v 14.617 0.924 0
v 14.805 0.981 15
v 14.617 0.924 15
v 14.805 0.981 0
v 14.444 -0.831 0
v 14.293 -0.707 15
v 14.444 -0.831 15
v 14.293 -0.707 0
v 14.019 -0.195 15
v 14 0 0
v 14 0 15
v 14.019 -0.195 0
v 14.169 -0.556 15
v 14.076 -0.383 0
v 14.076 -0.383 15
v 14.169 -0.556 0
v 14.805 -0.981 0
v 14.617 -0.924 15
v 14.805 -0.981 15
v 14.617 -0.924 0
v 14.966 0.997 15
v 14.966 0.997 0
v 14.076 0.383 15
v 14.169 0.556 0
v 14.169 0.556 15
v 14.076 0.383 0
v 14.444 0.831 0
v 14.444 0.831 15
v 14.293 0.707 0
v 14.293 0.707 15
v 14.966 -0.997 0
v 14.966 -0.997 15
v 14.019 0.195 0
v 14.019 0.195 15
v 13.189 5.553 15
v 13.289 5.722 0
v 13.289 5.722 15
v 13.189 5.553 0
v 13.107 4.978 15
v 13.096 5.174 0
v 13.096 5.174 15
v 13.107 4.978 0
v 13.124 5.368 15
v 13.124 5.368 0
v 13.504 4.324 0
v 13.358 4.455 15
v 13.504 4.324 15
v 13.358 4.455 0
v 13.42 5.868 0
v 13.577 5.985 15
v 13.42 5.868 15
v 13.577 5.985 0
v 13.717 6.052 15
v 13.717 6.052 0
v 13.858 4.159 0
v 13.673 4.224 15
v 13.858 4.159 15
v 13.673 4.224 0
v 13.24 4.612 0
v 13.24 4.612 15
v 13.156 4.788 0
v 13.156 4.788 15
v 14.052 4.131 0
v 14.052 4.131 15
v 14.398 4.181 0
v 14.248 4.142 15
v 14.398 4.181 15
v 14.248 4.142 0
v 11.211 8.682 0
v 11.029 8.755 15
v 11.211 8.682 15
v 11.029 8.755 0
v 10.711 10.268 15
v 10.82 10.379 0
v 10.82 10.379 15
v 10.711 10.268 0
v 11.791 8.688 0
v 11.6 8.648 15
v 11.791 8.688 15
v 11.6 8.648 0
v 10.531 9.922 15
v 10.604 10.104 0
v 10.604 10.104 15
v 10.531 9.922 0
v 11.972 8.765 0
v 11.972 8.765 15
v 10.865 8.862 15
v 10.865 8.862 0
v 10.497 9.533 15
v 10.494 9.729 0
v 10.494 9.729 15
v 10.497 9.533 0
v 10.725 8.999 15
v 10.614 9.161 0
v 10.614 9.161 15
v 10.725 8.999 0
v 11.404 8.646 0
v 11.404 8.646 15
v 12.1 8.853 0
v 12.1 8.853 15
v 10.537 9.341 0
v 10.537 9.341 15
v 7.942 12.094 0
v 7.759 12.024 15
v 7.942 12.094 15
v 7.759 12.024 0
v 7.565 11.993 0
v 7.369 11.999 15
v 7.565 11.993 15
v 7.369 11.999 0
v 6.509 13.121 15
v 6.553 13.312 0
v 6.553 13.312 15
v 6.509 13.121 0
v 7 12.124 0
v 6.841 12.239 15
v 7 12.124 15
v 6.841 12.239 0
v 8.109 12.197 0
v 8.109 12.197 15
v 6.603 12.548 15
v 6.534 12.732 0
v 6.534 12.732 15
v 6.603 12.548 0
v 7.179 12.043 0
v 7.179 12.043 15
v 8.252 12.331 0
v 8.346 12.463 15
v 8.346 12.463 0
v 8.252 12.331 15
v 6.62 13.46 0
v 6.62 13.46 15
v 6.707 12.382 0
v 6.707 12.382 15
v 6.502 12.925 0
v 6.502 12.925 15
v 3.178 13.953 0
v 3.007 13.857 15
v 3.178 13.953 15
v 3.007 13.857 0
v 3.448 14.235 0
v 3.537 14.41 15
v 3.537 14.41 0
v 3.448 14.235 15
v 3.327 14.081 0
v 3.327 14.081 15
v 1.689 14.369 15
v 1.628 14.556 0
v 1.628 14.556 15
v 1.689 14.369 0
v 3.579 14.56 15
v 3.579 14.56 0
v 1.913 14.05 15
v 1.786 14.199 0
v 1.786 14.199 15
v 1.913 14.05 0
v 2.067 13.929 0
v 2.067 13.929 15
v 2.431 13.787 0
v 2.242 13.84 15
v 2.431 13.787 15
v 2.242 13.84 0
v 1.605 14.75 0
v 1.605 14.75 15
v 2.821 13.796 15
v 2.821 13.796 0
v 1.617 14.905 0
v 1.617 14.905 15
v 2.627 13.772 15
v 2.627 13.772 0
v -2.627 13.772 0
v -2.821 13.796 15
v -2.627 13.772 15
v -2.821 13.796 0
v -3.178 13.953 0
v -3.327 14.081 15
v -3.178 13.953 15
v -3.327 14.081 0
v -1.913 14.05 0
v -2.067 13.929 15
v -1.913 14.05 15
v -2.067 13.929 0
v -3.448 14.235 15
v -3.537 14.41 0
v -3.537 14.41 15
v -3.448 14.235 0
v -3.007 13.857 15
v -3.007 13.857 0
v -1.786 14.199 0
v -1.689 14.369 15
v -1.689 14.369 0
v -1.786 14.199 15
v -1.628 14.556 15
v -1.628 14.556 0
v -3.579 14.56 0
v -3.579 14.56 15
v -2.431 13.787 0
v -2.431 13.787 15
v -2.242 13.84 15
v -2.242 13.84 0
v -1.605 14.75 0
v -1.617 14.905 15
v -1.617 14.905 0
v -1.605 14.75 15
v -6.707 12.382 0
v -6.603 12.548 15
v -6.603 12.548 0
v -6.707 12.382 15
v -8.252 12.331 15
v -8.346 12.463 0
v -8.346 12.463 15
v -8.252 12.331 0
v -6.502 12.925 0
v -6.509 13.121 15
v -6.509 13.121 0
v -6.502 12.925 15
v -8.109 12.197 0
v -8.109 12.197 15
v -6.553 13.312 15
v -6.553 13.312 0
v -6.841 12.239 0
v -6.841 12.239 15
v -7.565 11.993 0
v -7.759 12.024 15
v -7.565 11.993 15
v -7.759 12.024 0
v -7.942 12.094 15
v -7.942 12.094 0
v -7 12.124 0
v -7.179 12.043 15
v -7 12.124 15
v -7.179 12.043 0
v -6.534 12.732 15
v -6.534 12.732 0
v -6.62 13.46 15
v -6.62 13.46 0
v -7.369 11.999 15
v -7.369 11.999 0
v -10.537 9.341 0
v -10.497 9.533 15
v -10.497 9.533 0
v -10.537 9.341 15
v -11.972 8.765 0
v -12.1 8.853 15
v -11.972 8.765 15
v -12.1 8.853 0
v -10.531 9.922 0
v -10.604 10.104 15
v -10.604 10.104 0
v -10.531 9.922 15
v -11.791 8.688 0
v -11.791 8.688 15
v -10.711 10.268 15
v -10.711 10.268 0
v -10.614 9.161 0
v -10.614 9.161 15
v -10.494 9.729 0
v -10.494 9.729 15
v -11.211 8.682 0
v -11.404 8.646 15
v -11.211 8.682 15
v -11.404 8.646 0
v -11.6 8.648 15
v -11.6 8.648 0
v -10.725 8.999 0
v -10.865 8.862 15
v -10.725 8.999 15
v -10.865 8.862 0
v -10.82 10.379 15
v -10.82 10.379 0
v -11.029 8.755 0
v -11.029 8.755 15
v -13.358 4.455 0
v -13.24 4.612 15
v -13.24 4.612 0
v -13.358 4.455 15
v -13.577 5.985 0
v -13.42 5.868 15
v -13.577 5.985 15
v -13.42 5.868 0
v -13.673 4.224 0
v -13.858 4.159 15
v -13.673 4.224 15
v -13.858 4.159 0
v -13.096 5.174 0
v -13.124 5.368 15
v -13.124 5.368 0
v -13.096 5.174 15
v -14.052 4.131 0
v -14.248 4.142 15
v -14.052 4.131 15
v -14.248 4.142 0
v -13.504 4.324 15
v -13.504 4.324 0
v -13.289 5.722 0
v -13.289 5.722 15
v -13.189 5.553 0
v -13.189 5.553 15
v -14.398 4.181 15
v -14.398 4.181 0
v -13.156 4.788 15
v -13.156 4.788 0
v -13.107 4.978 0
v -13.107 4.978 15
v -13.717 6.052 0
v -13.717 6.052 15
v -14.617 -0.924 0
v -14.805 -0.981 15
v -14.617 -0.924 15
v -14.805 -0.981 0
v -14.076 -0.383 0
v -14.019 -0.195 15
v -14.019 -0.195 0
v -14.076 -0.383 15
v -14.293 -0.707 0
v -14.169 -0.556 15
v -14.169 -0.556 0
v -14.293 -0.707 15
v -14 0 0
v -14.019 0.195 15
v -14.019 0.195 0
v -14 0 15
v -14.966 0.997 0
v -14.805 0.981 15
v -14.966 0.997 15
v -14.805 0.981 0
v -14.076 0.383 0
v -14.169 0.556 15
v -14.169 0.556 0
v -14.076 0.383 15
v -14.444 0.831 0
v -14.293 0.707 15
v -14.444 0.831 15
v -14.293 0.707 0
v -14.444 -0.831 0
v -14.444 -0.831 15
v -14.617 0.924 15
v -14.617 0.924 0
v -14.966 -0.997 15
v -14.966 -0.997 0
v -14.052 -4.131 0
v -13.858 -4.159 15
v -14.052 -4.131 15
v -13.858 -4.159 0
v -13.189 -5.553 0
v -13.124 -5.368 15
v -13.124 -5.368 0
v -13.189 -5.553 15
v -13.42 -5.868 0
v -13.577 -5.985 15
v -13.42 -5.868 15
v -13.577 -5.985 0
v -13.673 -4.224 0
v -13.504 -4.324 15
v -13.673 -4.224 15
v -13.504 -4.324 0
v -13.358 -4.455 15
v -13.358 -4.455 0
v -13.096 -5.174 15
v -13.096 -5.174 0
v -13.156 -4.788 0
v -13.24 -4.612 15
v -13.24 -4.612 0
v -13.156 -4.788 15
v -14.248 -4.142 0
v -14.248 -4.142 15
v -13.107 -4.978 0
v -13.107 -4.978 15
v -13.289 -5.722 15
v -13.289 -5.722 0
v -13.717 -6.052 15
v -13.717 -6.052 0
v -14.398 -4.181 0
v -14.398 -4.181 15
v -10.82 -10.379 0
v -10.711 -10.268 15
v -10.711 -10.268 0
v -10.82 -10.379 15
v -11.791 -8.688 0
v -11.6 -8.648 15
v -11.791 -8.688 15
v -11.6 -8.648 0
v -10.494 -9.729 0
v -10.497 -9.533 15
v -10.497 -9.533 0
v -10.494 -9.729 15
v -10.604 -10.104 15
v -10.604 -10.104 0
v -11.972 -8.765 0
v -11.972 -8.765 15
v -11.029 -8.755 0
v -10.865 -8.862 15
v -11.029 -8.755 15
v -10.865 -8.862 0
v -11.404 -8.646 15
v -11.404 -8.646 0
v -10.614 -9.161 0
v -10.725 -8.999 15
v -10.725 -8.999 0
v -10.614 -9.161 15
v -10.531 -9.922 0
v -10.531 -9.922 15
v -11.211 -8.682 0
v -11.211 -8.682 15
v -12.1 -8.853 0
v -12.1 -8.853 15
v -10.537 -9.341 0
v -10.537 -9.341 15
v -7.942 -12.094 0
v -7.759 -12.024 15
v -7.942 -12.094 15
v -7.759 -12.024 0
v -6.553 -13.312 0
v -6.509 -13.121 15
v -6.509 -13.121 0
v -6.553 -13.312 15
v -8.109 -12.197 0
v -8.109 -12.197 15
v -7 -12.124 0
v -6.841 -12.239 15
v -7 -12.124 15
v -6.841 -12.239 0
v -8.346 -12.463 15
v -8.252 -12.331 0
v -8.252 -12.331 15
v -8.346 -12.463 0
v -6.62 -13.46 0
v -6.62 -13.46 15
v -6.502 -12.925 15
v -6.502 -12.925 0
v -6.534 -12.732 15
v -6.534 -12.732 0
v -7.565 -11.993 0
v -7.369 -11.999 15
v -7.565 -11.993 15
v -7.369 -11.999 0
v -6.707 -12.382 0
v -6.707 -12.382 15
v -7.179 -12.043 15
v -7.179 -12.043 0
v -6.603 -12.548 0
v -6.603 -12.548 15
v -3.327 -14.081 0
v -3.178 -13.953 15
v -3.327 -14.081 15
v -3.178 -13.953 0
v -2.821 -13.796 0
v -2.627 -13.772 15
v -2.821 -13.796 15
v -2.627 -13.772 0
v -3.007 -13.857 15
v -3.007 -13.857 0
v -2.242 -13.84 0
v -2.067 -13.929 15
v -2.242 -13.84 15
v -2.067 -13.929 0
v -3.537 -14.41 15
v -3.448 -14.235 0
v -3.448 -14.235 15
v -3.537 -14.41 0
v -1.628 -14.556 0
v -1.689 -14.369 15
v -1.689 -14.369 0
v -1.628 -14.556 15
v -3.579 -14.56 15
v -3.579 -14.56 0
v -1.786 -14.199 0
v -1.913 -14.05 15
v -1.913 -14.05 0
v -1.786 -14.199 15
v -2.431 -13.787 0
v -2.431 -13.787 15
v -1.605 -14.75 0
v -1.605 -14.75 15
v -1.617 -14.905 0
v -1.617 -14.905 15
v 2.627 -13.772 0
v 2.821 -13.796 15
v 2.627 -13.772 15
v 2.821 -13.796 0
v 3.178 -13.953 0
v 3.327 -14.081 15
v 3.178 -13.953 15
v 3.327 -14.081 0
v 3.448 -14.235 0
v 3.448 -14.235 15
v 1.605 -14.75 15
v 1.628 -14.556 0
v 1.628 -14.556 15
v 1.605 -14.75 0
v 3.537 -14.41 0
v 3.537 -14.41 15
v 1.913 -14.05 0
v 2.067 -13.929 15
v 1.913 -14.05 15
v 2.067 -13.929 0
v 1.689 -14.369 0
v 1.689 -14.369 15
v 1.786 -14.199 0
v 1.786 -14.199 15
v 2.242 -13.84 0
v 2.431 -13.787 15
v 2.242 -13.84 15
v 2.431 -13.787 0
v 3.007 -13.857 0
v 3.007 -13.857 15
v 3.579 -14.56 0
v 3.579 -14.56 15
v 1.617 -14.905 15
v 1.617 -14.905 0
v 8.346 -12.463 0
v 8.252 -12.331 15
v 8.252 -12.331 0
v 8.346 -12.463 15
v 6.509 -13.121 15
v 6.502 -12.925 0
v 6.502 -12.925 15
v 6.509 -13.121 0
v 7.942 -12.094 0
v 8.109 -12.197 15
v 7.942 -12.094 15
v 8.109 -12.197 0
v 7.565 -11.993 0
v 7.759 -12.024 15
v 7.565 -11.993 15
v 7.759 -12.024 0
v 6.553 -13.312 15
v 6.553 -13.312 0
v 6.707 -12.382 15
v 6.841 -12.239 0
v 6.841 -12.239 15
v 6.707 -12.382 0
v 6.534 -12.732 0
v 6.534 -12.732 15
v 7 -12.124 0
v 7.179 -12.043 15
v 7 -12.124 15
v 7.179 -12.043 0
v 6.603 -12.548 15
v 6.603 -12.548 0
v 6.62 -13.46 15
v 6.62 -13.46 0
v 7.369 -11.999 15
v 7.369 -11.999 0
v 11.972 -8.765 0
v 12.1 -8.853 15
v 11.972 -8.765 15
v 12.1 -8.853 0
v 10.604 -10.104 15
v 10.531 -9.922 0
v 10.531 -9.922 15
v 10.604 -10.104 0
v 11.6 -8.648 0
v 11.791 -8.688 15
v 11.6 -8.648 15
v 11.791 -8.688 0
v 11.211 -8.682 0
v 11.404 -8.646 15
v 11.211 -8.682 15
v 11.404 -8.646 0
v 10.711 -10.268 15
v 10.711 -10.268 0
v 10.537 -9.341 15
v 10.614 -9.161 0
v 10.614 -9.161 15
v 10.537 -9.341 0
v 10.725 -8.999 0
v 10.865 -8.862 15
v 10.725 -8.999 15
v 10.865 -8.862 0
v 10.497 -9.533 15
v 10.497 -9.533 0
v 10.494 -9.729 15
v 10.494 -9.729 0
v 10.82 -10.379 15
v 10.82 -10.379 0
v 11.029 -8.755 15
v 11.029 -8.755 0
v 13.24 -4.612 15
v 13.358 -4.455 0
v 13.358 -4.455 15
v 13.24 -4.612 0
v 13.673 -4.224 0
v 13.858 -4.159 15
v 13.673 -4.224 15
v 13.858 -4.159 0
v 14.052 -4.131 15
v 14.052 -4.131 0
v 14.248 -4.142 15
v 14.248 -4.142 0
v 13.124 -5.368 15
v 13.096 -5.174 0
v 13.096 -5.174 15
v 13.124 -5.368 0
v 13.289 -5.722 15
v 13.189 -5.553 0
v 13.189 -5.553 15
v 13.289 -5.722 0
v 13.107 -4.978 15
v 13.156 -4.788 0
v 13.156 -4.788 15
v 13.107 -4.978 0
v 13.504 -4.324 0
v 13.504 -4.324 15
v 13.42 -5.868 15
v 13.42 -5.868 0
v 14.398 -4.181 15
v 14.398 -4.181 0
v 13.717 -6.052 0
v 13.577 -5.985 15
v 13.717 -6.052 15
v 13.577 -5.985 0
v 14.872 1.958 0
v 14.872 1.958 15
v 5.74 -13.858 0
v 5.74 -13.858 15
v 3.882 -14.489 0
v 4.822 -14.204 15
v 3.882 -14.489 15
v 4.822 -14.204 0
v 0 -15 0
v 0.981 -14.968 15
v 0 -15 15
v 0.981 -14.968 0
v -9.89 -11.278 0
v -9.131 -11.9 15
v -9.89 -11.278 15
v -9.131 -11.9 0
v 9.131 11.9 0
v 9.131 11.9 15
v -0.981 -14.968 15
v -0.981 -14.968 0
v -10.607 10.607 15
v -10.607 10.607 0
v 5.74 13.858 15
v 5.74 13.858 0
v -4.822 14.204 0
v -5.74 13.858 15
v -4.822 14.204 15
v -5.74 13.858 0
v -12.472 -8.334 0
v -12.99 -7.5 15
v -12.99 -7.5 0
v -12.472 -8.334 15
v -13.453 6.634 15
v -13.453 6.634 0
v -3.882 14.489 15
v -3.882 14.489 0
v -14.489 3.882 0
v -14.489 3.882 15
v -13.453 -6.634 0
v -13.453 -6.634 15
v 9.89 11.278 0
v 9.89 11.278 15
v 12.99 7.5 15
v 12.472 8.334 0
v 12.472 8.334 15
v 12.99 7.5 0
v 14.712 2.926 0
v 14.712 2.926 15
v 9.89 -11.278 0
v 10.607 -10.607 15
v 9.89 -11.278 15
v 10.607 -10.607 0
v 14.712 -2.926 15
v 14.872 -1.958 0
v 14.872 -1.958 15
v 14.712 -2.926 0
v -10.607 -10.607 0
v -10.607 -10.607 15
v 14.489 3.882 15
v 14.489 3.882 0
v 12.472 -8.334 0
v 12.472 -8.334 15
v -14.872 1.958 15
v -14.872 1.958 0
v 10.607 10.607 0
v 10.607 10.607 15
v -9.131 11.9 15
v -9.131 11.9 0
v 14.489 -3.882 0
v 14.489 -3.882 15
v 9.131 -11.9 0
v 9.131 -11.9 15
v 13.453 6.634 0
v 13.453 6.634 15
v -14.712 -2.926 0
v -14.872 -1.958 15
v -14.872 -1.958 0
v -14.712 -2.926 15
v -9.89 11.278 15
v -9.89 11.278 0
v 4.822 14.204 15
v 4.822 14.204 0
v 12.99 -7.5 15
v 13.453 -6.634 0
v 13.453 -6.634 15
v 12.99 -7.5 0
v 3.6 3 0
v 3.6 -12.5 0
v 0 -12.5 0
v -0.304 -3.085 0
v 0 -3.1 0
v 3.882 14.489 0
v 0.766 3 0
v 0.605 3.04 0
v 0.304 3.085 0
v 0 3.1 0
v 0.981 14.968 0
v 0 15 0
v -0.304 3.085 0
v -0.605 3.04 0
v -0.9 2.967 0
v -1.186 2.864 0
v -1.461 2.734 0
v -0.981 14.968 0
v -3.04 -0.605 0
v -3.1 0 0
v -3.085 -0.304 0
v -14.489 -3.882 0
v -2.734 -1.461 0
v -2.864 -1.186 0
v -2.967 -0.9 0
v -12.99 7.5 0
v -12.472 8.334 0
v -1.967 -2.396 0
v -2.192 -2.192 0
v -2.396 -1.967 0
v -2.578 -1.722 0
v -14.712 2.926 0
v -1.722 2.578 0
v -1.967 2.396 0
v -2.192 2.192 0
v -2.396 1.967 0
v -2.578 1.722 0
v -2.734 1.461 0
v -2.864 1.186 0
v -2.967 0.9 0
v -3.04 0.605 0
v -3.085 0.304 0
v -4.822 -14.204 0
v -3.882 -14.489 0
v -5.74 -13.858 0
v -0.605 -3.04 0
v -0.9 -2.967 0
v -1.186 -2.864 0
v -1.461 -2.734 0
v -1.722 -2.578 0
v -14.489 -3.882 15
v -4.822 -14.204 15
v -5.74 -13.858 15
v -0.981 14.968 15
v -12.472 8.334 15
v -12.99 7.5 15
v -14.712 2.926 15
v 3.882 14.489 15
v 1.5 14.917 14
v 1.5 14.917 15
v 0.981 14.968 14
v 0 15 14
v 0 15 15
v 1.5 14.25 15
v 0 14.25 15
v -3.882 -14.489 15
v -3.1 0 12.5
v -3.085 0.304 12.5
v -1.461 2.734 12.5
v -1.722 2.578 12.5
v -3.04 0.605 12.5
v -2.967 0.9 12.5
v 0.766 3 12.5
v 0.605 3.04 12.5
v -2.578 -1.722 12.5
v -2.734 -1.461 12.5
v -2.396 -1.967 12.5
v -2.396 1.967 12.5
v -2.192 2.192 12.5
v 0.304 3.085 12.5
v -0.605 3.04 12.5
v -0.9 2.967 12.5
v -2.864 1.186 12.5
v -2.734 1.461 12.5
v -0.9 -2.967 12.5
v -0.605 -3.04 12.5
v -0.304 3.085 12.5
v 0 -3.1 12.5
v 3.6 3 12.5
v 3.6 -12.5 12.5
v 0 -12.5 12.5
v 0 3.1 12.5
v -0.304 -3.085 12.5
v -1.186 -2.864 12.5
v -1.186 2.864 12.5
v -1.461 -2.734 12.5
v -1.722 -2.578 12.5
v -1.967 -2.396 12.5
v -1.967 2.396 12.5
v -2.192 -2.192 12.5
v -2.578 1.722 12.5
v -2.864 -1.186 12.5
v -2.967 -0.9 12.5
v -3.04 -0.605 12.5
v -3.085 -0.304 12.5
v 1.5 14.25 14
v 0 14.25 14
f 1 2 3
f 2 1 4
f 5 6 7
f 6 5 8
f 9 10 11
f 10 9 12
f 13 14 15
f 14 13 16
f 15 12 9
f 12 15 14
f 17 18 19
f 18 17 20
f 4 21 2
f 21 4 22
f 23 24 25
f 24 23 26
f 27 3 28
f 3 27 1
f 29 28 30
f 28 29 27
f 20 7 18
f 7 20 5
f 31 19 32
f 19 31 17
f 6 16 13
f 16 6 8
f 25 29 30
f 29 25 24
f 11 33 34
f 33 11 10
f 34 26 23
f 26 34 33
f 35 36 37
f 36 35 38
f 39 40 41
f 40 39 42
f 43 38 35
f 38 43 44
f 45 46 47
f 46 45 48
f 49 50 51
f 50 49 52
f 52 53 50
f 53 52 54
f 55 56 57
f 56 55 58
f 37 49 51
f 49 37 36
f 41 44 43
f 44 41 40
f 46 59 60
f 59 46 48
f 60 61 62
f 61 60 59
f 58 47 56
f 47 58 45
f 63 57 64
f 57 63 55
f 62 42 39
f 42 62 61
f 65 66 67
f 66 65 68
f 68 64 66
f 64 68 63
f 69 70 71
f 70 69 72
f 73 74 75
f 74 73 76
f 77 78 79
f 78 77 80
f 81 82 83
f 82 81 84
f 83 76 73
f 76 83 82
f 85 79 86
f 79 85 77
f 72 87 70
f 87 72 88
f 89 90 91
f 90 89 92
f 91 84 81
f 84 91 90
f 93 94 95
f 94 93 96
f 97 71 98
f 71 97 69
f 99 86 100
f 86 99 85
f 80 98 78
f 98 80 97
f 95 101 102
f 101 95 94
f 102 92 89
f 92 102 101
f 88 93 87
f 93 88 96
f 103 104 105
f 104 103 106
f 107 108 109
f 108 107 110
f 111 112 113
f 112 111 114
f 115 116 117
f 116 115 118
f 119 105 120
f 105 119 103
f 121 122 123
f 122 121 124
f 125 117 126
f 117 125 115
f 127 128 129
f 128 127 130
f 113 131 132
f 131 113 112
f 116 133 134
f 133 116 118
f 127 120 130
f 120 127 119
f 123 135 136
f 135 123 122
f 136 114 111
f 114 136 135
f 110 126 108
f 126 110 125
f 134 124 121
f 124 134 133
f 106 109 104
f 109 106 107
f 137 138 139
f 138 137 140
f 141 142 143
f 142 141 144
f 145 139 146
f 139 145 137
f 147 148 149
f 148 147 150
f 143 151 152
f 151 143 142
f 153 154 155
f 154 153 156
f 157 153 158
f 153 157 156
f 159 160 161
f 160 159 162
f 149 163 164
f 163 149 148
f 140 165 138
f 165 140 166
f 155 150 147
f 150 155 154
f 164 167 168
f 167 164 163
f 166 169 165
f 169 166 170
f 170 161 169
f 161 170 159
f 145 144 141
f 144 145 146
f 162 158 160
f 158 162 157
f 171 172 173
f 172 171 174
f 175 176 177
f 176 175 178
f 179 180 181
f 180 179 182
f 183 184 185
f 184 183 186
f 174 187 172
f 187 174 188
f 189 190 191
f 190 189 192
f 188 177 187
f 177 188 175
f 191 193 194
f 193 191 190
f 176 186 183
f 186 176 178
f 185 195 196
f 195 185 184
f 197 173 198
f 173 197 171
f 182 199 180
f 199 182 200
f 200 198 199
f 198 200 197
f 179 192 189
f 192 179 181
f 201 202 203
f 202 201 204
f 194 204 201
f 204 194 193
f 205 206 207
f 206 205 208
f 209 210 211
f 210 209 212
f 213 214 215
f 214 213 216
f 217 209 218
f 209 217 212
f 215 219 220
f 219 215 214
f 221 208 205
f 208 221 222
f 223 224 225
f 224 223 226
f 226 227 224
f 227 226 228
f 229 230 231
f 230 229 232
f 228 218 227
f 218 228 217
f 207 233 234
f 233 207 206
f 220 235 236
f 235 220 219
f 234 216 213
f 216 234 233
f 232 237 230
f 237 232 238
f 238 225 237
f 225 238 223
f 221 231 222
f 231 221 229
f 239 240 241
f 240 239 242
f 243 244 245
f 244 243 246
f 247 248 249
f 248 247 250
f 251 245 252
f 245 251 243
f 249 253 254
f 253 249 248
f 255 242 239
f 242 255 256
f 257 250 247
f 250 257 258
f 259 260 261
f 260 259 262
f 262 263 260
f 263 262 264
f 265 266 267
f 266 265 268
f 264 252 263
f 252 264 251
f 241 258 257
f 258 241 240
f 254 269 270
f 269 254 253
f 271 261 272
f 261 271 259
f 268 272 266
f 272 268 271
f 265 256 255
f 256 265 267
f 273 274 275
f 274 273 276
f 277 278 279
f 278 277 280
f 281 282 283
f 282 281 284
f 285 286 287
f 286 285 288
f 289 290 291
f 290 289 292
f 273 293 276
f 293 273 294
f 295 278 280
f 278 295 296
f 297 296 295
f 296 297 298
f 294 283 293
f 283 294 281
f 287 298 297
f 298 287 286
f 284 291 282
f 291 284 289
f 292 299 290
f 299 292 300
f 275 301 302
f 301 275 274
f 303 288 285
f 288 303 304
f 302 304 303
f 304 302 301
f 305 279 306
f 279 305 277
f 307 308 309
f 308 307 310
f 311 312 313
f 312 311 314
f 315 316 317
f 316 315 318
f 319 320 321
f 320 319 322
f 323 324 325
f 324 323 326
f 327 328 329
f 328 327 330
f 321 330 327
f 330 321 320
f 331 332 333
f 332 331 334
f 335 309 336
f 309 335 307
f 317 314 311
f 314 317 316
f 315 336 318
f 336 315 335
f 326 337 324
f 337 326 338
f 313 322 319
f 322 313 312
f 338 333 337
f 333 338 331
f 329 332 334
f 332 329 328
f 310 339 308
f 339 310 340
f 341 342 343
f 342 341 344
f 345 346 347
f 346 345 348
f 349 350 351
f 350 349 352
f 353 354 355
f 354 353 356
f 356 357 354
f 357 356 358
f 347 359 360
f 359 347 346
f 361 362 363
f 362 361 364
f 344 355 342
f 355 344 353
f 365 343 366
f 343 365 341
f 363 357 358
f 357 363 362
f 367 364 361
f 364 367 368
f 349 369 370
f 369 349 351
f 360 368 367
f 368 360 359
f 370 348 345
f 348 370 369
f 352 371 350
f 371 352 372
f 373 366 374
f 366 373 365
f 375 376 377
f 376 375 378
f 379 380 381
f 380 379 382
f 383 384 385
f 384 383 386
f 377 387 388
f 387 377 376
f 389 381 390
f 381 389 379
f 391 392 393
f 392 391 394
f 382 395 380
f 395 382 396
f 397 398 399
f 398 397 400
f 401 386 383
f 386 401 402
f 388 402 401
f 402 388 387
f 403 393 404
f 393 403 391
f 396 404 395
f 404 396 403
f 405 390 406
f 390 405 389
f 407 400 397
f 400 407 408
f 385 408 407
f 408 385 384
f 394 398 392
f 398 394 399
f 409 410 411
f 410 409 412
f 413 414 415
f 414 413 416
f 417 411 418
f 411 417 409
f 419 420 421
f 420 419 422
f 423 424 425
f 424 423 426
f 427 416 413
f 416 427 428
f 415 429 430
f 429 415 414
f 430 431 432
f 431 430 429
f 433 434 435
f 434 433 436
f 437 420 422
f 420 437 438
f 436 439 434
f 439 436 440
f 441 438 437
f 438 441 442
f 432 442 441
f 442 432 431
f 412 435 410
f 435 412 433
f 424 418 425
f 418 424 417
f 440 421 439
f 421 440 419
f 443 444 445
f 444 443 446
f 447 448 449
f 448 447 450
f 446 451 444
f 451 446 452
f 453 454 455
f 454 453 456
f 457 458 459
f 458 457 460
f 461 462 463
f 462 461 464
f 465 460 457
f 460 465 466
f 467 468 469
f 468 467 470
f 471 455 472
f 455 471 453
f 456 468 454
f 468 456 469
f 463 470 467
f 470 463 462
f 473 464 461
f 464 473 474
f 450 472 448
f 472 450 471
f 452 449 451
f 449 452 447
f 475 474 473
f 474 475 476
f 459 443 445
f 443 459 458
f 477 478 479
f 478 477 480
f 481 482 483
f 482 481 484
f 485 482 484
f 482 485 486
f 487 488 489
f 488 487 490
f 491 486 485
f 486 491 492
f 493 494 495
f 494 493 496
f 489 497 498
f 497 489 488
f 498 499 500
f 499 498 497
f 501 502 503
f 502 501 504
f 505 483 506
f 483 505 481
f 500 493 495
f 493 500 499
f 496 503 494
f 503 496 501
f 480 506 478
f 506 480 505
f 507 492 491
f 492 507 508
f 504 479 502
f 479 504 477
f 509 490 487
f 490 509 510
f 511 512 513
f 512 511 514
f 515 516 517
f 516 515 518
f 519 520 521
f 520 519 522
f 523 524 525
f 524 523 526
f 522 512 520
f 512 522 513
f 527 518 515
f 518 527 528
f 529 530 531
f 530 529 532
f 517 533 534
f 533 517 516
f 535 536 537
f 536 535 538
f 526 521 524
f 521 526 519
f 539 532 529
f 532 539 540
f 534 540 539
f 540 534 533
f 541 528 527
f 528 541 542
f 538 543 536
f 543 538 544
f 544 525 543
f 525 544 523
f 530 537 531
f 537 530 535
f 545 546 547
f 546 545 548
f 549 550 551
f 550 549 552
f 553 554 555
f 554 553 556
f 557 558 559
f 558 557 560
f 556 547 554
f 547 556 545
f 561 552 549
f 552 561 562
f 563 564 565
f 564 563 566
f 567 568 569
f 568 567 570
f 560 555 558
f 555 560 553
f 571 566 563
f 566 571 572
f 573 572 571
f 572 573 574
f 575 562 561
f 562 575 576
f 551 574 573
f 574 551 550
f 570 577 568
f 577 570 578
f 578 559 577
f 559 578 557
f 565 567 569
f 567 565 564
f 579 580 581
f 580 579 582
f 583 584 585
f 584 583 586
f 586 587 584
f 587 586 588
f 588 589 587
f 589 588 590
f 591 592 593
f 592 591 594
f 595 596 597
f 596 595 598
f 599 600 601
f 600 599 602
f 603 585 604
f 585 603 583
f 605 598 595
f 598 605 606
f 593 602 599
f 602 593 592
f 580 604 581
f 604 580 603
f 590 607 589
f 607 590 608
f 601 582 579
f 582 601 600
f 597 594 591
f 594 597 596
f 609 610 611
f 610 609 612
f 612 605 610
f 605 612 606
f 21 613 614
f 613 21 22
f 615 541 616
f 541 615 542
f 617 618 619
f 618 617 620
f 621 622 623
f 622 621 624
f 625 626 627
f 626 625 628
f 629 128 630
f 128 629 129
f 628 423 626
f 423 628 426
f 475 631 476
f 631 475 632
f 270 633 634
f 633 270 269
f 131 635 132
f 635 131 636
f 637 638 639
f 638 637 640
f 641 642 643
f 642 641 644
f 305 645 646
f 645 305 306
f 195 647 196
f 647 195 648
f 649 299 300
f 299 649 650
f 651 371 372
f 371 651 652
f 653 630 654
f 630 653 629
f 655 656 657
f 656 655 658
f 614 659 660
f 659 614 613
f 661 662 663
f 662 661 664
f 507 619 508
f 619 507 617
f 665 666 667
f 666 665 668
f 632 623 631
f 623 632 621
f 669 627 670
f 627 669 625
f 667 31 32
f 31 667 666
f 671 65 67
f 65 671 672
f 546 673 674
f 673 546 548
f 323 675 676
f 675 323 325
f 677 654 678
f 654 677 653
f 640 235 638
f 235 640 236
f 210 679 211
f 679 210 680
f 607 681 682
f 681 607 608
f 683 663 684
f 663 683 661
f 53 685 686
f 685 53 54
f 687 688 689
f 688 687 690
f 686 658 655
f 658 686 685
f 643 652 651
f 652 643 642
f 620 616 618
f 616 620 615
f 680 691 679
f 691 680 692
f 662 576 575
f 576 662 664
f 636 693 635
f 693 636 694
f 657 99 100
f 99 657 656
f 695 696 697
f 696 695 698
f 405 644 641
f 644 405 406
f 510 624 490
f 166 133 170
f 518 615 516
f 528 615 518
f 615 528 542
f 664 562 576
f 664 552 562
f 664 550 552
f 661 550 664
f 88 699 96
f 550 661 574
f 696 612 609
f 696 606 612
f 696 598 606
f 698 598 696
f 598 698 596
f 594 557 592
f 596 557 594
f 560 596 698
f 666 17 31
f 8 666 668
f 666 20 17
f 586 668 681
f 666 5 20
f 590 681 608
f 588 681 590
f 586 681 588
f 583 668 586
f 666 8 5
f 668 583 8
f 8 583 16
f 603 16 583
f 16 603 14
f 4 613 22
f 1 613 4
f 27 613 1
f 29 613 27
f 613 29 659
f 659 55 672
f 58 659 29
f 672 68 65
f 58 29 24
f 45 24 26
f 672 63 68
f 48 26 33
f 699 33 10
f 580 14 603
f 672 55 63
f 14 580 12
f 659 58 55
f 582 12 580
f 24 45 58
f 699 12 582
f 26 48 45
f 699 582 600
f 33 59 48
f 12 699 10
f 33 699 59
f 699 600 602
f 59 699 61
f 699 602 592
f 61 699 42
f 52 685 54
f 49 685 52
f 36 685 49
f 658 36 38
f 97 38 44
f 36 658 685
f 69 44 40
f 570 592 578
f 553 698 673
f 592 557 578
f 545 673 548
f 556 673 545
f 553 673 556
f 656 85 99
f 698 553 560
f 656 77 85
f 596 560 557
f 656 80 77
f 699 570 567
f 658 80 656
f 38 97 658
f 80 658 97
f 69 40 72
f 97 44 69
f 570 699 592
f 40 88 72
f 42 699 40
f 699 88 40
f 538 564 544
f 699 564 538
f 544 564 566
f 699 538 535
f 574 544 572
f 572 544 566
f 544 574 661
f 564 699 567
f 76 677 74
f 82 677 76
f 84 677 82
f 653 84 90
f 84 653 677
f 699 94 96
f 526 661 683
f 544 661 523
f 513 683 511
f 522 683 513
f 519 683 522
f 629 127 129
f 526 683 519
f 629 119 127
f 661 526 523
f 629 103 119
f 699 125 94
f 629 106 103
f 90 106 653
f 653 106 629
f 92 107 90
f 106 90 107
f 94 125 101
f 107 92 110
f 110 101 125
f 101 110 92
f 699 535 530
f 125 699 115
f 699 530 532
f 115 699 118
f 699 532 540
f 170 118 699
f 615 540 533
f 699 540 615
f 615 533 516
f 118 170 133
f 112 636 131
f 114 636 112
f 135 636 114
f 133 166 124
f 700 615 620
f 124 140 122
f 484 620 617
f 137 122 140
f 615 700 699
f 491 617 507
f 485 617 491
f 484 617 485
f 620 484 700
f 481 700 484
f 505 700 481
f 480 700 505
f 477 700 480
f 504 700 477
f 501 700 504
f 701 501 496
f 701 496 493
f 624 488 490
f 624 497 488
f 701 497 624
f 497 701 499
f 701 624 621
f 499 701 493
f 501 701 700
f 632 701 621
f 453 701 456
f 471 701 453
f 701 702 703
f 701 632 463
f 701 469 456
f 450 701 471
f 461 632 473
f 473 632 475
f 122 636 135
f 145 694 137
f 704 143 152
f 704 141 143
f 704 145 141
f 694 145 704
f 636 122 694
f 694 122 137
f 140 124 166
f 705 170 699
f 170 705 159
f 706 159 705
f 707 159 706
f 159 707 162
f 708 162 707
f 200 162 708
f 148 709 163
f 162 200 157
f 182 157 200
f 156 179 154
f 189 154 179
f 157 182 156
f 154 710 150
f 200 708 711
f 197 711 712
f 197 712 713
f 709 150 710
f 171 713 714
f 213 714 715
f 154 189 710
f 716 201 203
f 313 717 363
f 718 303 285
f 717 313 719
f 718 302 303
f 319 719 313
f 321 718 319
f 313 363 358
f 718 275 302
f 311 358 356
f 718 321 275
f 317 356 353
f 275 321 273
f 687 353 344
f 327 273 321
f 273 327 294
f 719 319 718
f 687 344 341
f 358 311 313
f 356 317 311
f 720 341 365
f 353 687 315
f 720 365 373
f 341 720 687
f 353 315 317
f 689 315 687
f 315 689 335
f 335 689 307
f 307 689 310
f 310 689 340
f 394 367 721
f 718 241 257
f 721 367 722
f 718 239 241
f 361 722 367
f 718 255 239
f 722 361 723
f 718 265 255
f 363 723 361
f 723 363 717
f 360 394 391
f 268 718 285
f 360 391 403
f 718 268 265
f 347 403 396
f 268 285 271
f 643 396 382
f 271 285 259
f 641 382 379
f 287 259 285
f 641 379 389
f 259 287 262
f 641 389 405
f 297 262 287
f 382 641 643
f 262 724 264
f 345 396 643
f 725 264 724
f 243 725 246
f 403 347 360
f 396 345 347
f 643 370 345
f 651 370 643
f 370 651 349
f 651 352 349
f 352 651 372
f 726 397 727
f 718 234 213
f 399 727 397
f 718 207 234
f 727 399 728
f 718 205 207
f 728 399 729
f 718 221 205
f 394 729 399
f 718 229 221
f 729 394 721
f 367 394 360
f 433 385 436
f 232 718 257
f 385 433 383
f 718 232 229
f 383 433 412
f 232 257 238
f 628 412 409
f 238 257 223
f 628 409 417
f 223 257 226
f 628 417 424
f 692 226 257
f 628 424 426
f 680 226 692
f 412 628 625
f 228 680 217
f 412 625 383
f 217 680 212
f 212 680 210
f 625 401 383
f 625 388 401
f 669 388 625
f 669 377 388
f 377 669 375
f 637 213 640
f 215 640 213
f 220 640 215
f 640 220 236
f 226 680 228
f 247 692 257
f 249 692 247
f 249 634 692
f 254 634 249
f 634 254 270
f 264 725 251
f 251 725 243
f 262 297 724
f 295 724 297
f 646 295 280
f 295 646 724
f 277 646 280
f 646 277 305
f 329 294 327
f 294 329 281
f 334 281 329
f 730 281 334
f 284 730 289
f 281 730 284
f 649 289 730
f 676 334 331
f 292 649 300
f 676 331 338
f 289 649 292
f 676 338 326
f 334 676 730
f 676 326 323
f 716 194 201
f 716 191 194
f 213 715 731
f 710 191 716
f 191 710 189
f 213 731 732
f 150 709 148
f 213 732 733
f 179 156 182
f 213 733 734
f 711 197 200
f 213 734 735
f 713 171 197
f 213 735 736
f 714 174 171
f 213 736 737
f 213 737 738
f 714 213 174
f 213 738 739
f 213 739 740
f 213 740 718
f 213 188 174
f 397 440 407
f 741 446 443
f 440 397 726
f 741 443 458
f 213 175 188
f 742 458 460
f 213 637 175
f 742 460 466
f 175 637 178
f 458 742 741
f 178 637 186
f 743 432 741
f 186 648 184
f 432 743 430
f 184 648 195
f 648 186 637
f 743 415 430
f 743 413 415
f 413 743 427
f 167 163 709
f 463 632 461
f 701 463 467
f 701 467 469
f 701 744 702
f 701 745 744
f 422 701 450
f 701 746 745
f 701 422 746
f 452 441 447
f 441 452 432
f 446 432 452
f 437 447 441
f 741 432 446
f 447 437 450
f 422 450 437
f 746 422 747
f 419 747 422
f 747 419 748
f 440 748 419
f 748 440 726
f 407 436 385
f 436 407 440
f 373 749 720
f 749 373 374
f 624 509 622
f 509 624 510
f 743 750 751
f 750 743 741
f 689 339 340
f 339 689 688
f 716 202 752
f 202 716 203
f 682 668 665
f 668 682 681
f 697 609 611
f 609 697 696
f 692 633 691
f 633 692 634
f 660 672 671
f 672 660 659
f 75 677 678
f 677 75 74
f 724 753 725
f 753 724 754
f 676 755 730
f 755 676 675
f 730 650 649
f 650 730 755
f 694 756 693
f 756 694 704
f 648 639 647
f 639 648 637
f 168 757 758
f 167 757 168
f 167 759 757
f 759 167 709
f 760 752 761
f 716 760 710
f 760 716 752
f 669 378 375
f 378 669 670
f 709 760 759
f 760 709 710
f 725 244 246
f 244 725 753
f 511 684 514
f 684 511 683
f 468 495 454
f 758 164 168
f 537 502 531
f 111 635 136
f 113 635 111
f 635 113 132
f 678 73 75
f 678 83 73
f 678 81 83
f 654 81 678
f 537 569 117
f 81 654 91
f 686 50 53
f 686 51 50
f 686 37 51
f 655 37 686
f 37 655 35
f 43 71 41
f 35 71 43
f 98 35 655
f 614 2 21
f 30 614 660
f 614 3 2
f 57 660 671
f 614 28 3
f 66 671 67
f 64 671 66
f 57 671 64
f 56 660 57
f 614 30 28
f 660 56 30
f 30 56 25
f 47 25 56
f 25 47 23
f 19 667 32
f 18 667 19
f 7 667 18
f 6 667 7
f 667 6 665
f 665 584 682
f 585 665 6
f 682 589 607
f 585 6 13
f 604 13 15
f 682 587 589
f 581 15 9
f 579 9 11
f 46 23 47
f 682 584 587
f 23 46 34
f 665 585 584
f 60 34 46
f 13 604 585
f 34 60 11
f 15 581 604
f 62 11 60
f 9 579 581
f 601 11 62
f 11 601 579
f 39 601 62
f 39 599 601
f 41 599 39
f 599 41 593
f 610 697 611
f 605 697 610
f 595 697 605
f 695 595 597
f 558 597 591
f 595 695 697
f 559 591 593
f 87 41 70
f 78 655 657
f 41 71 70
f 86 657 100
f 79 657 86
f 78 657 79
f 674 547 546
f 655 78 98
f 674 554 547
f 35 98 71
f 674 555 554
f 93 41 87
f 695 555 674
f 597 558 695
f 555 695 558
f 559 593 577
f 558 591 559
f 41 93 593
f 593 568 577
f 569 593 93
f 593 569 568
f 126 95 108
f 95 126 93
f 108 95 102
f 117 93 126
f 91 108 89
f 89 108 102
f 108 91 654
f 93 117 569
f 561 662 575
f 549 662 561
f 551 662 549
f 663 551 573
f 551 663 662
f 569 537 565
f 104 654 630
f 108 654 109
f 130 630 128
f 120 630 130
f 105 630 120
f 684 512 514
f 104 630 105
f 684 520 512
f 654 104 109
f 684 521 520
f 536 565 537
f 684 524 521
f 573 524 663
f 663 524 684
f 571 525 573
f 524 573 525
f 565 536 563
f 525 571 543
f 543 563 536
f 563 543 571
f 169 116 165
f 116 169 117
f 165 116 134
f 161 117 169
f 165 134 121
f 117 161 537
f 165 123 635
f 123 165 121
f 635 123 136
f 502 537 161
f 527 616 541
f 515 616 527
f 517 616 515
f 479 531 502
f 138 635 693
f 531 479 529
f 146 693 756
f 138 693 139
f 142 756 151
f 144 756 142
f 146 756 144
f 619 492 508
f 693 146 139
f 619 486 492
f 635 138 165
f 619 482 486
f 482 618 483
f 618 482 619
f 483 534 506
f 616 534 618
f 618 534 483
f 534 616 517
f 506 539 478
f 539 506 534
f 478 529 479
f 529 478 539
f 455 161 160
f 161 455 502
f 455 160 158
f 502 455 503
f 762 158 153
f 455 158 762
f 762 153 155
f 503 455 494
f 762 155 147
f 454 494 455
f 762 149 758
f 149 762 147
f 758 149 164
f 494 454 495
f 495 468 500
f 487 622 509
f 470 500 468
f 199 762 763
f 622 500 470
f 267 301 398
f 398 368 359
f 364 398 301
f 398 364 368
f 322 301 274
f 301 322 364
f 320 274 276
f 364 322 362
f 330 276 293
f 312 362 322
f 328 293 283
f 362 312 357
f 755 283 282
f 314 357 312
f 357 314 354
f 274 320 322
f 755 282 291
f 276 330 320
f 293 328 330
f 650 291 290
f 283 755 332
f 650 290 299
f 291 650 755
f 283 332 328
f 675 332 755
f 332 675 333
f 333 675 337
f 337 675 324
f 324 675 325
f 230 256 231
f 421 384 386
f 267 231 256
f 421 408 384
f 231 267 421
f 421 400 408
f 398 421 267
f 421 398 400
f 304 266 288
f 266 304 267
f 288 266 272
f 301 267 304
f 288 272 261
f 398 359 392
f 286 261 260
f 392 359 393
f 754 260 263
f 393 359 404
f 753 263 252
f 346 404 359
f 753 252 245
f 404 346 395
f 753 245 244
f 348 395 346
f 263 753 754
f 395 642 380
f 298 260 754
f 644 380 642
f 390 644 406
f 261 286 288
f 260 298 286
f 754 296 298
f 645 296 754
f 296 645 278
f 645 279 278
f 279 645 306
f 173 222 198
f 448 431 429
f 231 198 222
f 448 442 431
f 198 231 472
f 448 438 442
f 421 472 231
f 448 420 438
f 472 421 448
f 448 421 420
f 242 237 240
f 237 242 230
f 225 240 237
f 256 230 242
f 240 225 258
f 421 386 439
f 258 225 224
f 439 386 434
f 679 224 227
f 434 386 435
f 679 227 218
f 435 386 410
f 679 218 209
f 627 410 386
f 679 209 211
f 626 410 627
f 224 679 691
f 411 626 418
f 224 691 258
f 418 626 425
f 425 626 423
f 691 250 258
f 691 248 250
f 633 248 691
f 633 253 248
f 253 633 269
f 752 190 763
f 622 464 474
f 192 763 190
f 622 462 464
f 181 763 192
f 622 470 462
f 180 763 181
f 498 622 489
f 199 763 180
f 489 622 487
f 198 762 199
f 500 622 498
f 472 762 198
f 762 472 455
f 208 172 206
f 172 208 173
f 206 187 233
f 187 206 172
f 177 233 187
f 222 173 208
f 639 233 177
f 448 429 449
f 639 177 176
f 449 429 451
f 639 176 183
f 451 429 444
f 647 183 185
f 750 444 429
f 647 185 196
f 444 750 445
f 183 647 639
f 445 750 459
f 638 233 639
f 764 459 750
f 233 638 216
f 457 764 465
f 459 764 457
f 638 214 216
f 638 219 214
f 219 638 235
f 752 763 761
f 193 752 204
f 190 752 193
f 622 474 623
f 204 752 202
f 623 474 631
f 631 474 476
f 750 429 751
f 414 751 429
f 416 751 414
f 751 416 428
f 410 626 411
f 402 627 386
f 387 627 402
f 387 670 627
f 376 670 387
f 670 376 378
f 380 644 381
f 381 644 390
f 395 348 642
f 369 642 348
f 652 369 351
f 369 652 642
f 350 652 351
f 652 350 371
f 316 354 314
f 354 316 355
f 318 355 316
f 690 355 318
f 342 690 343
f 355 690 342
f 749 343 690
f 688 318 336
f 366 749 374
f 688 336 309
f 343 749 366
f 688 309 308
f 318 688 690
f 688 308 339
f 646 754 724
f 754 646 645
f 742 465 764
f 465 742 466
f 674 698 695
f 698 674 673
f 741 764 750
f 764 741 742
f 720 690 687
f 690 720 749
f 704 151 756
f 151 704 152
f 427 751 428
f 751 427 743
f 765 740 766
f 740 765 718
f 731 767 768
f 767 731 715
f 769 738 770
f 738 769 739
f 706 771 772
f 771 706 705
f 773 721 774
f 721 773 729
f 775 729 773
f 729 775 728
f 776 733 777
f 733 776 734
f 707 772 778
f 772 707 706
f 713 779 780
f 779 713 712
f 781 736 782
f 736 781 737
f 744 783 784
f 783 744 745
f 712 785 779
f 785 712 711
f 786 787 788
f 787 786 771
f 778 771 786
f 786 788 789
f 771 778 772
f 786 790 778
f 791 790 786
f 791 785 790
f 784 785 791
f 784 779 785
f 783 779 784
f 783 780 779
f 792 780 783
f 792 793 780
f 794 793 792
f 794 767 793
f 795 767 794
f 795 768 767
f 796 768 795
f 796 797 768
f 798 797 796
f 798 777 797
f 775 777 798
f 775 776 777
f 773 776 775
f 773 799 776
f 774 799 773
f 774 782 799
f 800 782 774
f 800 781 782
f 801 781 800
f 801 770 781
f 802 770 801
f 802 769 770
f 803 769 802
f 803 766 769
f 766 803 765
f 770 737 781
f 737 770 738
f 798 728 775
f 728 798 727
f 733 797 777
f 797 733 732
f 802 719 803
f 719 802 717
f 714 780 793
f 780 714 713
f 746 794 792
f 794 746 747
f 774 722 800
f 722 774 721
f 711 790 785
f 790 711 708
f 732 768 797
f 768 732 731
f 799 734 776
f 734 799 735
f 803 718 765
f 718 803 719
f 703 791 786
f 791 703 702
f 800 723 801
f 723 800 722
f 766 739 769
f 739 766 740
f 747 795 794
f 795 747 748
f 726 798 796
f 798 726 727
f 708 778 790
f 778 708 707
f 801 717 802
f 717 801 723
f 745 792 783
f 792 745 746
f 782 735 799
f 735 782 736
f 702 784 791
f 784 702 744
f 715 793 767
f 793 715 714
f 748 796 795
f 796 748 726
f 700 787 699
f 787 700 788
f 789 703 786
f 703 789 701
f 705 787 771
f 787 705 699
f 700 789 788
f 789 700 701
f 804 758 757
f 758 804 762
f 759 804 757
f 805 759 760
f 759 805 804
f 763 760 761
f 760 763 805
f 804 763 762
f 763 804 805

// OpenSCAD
// Replacement knob for hotplate stirrer with D-shaft
// Print orientation: flat side of D bore faces the hotplate (z = 0)

// ---------------- Parameters ----------------
knob_d        = 30;    // knob outer diameter
knob_h        = 15;    // knob height
shaft_d       = 6.2;   // D-bore diameter (shaft clearance)
bore_depth    = 12;    // D-bore depth from bottom face
groove_count  = 18;    // number of vertical grip grooves
groove_d      = 2;     // groove diameter (half-cylinder)
pointer_w     = 1.5;   // pointer groove width
pointer_d     = 1;     // pointer groove depth
eps           = 0.5;   // overcut for clean boolean differences

$fn = 96;

// Derived
outer_r = knob_d / 2;
// Check: distance from flat to opposite side of D = bore_depth - shaft_d/2
// (included for the user's reference: 12 - 3.1 = 8.9 mm)

// ---------------- Model ----------------
difference() {
    // Main body
    cylinder(d = knob_d, h = knob_h);

    // D-shaped blind bore from bottom face
    translate([0, 0, -eps])
        cylinder(d = shaft_d, h = bore_depth + 2 * eps, $fn = 64);
    // Flat side of the D, centred on the -Y axis
    translate([0, -bore_depth - eps, -eps])
        cube([shaft_d / 2 + eps, outer_r + eps, bore_depth + 2 * eps]);

    // Vertical grip grooves along the full height
    for (i = [0 : groove_count - 1])
        rotate([0, 0, i * 360 / groove_count])
            translate([outer_r, 0, -eps])
                cylinder(d = groove_d, h = knob_h + 2 * eps, $fn = 32);

    // Pointer groove on the top face, centred on the +Y axis
    translate([0, outer_r - pointer_w / 2, knob_h - pointer_d])
        cube([pointer_w, pointer_w, pointer_d + eps]);
}
